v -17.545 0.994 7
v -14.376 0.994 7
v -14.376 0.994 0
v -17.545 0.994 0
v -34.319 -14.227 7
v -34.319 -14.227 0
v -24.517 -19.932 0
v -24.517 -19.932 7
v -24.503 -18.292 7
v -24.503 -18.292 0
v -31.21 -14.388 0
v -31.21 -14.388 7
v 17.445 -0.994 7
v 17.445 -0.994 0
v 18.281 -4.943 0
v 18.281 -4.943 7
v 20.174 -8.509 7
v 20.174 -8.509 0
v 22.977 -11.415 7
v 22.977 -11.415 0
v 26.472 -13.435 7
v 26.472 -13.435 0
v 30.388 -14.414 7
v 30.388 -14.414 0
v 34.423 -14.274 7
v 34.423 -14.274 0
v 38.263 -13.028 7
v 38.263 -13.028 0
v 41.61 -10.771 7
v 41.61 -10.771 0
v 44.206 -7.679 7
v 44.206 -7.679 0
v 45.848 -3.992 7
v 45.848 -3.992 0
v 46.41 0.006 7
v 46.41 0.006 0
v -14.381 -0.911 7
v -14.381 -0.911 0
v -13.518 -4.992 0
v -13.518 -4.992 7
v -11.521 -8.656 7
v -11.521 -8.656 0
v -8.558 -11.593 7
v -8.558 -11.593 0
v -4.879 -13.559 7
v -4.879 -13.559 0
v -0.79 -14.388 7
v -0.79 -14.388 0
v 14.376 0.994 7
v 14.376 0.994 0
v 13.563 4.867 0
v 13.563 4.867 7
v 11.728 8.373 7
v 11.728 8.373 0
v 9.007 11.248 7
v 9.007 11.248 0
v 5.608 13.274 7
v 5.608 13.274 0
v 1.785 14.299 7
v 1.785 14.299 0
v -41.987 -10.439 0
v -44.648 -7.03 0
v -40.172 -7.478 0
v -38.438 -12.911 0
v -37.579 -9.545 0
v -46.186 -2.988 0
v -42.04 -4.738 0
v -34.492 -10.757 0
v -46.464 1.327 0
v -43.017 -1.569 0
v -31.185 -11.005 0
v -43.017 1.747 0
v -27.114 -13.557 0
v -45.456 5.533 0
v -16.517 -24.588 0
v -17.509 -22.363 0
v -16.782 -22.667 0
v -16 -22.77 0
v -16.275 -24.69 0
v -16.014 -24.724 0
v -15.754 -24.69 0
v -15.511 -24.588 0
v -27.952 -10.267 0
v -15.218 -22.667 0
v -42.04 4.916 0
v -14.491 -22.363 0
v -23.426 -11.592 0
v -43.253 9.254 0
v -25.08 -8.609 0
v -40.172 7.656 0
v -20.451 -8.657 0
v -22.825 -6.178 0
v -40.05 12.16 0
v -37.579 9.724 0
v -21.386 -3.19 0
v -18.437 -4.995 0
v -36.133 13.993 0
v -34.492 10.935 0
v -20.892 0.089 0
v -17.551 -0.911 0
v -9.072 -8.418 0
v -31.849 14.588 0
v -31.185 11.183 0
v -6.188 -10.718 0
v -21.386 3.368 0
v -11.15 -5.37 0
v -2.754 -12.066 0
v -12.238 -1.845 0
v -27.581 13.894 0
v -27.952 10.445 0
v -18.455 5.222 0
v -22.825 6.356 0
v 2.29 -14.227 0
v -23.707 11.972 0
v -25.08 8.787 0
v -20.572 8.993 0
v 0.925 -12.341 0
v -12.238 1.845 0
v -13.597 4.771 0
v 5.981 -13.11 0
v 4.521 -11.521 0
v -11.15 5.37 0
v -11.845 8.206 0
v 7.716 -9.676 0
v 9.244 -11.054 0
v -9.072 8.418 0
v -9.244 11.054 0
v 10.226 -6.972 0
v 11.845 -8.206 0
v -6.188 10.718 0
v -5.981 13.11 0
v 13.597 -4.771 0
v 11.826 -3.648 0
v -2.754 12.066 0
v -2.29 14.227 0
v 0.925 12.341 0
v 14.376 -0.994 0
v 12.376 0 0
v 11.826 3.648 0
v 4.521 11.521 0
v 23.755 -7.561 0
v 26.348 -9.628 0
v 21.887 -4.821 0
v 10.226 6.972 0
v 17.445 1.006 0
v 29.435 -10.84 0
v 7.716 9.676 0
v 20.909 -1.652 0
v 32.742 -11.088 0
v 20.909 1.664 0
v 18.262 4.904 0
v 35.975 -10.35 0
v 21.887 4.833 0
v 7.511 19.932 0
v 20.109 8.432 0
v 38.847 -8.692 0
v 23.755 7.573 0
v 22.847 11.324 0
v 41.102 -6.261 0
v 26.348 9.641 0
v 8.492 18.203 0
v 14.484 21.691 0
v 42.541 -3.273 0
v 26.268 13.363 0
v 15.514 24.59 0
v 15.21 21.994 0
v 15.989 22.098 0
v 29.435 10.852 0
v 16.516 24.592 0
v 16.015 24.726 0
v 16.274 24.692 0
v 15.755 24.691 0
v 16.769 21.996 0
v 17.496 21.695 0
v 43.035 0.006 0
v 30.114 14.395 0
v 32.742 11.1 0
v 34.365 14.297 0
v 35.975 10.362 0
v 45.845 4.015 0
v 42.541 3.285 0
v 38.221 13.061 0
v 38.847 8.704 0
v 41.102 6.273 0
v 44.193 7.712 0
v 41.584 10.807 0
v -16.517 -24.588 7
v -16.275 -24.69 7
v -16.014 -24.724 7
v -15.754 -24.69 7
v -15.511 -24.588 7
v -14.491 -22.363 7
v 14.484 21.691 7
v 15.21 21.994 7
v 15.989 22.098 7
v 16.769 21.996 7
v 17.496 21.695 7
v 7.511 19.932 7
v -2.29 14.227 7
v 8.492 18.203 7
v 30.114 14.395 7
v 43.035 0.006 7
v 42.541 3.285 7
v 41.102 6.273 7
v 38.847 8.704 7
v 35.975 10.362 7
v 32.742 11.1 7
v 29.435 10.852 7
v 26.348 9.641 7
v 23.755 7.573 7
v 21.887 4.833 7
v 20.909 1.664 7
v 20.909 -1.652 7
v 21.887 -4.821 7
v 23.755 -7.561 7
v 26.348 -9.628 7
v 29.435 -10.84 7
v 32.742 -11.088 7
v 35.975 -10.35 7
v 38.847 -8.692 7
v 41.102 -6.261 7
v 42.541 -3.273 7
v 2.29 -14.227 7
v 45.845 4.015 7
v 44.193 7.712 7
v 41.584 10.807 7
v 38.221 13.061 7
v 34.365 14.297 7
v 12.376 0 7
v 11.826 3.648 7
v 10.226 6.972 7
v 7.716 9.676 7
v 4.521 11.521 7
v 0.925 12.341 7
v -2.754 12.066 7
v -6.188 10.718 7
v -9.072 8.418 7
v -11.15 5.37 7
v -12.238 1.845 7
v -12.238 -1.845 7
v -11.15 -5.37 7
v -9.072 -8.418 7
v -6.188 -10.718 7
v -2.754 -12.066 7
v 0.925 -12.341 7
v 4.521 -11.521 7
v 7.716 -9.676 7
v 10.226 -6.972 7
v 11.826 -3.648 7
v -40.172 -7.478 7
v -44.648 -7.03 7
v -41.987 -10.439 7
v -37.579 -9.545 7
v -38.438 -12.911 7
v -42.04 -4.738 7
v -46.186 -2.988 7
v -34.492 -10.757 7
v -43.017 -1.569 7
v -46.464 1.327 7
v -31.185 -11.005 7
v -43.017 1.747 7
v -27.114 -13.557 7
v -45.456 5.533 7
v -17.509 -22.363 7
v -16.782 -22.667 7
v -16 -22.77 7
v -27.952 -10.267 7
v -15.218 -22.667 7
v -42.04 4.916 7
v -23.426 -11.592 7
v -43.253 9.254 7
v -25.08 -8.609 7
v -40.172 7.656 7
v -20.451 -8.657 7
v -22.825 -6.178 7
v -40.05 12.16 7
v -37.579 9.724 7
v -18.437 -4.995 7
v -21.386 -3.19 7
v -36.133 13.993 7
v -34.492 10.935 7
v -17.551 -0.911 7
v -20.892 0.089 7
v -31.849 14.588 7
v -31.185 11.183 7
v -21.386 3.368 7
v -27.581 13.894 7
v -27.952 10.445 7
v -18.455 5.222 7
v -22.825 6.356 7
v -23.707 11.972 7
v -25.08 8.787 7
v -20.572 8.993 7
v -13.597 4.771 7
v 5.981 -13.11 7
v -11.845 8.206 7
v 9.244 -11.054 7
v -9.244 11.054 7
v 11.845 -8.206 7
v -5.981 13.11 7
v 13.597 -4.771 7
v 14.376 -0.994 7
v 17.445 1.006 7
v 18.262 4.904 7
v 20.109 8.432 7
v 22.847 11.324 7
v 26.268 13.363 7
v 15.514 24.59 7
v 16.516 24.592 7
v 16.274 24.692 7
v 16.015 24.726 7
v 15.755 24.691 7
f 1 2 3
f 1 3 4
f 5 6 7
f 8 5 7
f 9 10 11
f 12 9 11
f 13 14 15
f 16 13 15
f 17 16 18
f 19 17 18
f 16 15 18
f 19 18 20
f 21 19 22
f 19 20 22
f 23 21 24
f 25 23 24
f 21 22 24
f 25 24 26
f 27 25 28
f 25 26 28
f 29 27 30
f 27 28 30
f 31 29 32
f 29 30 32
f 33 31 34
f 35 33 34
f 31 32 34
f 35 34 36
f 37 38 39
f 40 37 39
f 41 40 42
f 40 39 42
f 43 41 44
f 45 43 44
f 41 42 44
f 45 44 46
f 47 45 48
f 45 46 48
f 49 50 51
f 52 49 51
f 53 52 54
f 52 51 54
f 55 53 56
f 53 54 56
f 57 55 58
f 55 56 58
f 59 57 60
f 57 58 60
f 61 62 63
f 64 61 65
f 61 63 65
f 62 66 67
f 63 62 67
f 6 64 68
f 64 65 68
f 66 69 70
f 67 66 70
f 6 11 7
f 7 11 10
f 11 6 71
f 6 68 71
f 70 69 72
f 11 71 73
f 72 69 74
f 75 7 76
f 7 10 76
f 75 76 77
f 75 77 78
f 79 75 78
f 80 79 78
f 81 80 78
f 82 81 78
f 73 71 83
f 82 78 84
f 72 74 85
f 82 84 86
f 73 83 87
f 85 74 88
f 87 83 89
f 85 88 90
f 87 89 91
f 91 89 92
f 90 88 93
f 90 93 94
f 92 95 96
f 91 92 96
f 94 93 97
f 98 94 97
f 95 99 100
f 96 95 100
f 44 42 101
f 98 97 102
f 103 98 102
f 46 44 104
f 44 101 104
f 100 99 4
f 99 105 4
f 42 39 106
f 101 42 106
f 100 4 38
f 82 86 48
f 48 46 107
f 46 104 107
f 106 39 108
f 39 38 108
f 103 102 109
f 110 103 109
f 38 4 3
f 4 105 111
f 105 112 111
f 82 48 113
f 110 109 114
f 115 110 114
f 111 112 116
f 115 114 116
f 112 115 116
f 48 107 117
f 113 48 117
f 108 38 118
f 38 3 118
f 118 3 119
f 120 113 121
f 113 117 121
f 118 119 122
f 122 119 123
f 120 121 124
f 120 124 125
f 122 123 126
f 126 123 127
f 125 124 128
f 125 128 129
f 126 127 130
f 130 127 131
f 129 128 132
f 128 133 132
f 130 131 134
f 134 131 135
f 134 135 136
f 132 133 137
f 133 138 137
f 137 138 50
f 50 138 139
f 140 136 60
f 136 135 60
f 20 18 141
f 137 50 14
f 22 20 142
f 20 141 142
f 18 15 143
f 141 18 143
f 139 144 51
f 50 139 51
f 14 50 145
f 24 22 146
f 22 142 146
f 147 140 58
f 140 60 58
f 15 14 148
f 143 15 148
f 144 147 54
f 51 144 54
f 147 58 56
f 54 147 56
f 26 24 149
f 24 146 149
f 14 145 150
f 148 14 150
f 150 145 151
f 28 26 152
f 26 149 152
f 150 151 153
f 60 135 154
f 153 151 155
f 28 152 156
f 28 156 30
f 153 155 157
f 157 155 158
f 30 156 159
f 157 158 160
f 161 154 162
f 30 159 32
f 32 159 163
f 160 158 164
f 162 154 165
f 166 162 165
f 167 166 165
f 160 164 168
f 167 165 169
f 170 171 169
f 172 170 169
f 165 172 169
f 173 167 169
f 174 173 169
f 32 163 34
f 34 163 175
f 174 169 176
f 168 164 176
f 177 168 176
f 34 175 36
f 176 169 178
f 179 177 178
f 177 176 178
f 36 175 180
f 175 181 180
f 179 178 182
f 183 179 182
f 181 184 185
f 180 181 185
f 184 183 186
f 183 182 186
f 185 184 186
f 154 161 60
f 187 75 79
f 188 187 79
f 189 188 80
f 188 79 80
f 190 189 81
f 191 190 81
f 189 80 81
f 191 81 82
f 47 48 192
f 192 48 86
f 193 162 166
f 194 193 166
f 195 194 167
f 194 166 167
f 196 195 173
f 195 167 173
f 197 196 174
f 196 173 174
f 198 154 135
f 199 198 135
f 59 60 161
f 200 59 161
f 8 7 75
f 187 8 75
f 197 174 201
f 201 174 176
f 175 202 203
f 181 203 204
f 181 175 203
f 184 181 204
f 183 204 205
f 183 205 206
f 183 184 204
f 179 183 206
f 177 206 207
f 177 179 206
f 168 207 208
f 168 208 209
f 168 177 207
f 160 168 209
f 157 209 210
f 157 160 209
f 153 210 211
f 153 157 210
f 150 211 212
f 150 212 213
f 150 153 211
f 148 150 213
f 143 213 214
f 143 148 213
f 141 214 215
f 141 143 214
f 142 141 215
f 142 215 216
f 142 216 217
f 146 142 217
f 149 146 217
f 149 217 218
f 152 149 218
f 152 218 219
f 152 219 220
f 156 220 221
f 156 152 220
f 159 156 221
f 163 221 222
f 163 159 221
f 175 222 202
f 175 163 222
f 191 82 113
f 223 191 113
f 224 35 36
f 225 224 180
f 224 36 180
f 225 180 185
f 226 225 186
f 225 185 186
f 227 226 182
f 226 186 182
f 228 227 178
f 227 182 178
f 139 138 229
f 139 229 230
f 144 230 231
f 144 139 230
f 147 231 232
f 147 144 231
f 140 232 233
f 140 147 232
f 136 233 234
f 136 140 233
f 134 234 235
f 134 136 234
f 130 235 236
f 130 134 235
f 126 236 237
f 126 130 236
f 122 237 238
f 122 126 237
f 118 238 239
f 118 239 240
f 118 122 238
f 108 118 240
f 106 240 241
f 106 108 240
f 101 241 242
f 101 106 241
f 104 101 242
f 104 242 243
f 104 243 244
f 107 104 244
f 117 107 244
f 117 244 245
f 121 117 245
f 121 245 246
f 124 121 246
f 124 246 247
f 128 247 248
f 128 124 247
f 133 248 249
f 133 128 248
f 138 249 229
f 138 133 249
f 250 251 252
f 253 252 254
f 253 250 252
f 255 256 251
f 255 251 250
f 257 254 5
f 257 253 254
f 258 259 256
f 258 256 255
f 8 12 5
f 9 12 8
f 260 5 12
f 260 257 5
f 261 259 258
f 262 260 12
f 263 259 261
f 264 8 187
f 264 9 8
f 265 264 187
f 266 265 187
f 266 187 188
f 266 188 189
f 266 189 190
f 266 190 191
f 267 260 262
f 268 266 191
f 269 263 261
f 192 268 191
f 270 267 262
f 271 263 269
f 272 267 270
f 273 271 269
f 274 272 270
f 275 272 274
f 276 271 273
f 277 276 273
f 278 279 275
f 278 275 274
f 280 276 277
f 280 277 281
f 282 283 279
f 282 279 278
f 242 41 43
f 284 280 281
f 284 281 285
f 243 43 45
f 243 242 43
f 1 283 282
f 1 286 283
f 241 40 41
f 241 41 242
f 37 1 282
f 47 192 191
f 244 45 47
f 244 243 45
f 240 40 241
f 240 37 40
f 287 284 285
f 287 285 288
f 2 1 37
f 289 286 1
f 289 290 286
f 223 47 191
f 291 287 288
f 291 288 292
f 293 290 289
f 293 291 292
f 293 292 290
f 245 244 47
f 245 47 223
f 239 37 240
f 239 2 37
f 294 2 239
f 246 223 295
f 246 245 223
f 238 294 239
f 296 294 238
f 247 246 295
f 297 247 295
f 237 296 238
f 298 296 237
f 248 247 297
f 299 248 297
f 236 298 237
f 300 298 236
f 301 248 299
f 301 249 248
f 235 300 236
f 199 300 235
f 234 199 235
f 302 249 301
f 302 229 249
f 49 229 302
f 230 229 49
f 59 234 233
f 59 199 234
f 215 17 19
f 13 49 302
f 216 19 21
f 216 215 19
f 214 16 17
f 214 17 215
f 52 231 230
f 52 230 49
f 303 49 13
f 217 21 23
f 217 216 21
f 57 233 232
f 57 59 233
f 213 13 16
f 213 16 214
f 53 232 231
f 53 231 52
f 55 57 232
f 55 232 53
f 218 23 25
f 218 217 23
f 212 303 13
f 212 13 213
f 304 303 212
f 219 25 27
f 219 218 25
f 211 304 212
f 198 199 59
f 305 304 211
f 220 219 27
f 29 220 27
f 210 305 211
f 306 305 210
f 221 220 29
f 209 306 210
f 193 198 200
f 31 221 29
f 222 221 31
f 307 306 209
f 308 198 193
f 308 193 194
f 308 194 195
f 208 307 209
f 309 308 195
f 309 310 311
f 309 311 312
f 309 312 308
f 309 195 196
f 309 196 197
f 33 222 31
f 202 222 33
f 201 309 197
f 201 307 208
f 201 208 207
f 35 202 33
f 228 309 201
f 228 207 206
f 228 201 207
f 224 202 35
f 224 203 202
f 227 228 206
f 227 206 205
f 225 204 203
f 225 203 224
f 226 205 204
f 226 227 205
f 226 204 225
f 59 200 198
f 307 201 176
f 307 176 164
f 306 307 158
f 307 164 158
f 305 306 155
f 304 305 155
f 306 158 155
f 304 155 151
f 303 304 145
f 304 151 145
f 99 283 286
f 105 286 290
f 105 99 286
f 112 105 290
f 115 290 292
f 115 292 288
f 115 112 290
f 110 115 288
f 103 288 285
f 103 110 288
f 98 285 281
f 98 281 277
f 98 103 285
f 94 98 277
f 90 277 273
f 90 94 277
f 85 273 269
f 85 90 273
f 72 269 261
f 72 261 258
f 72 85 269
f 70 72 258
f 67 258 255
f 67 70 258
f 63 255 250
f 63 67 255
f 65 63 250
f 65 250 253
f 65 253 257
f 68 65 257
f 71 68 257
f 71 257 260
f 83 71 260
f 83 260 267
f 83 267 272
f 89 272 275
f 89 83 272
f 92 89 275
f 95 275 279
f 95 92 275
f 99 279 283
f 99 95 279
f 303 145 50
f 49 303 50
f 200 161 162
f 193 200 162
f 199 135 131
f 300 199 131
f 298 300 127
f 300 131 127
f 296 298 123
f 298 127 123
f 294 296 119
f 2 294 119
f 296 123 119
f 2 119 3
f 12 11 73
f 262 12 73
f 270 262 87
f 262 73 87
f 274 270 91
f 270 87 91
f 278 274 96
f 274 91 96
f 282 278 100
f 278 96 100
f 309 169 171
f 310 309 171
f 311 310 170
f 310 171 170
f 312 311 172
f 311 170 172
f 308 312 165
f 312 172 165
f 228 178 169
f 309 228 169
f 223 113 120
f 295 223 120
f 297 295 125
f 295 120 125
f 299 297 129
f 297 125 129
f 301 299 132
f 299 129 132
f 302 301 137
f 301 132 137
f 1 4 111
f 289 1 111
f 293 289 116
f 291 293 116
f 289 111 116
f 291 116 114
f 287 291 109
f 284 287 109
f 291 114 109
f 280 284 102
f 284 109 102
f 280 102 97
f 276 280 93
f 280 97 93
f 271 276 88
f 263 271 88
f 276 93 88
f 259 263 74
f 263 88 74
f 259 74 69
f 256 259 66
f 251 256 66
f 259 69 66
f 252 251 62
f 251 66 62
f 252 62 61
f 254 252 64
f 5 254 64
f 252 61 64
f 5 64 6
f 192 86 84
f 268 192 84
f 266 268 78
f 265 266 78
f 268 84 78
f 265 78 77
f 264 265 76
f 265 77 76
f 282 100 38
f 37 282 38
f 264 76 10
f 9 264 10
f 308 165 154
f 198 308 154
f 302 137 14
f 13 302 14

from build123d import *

# Parameters (mm, degrees)
F0_R     = 11.125
F0_R_2   = 12.376086
F1_DEPTH = 7


with BuildPart() as f1:
    # F0 (on Top) → F1 (new body)
    with BuildSketch(Plane.XY):
        with BuildLine():
            ThreePointArc((-17.516571, 0.089216), (-17.523634, 0.541725), (-17.544814, 0.993793))
            ThreePointArc((-17.544814, 0.993793), (-41.760355, 10.827403), (-34.318804, -14.22685))
            ThreePointArc((-34.318804, -14.22685), (-32.768784, -14.39126), (-31.210072, -14.388338))
            ThreePointArc((-31.210072, -14.388338), (-21.832298, -10.23215), (-17.551095, -0.910784))
            ThreePointArc((-17.551095, -0.910784), (-17.525205, -0.411082), (-17.516571, 0.089216))
        make_face()
        with Locations((-32.016571, 0.089216)):
            Circle(F0_R, mode=Mode.SUBTRACT)
        with BuildLine():
            ThreePointArc((14.375696, -0.993793), (14.401426, -0.497193), (14.410006, 0))
            ThreePointArc((14.410006, 0), (14.401426, 0.497193), (14.375696, 0.993793))
            ThreePointArc((14.375696, 0.993793), (10.466538, 9.904537), (1.784877, 14.299038))
            ThreePointArc((1.784877, 14.299038), (-0.255218, 14.407745), (-2.290183, 14.226852))
            ThreePointArc((-2.290183, 14.226852), (-10.640317, 9.717609), (-14.375696, 0.993793))
            ThreePointArc((-14.375696, 0.993793), (-14.409946, 0.041595), (-14.381194, -0.910784))
            ThreePointArc((-14.381194, -0.910784), (-10.146519, -10.232127), (-0.789928, -14.388338))
            ThreePointArc((-0.789928, -14.388338), (0.754468, -14.390241), (2.290198, -14.22685))
            ThreePointArc((2.290198, -14.22685), (10.640322, -9.717603), (14.375696, -0.993793))
        make_face()
        Circle(F0_R_2, mode=Mode.SUBTRACT)
        with BuildLine():
            Line((-15.511252, -24.588406), (2.290198, -14.22685))
            ThreePointArc((2.290198, -14.22685), (0.754468, -14.390241), (-0.789928, -14.388338))
            Line((-0.789928, -14.388338), (-14.490846, -22.363129))
            ThreePointArc((-14.490846, -22.363129), (-16, -22.770359), (-17.509154, -22.363129))
            Line((-17.509154, -22.363129), (-24.503051, -18.292243))
            Line((-24.503051, -18.292243), (-31.210072, -14.388338))
            ThreePointArc((-31.210072, -14.388338), (-32.768784, -14.39126), (-34.318804, -14.22685))
            Line((-34.318804, -14.22685), (-24.517354, -19.931906))
            Line((-24.517354, -19.931906), (-16.517354, -24.588406))
            ThreePointArc((-16.517354, -24.588406), (-16.014303, -24.724149), (-15.511252, -24.588406))
        make_face()
        with BuildLine():
            ThreePointArc((30.114196, 14.394545), (21.378316, 9.9726), (17.444744, 1.006207))
            ThreePointArc((17.444744, 1.006207), (17.41022, 0.006207), (17.444744, -0.993793))
            ThreePointArc((17.444744, -0.993793), (32.410518, -14.48516), (46.41022, 0.006207))
            ThreePointArc((46.41022, 0.006207), (42.997331, 9.351042), (34.36526, 14.29686))
            ThreePointArc((34.36526, 14.29686), (32.243328, 14.50238), (30.114196, 14.394545))
        make_face()
        with Locations((31.91022, 0.006207)):
            Circle(F0_R, mode=Mode.SUBTRACT)
        with BuildLine():
            ThreePointArc((14.375696, 0.993793), (14.401426, 0.497193), (14.410006, 0))
            ThreePointArc((14.410006, 0), (14.401426, -0.497193), (14.375696, -0.993793))
            Line((14.375696, -0.993793), (17.444744, -0.993793))
            ThreePointArc((17.444744, -0.993793), (17.41022, 0.006207), (17.444744, 1.006207))
            Line((17.444744, 1.006207), (14.375696, 0.993793))
        make_face()
        with BuildLine():
            ThreePointArc((-2.290183, 14.226852), (-0.255218, 14.407745), (1.784877, 14.299038))
            Line((1.784877, 14.299038), (8.491907, 18.202972))
            Line((8.491907, 18.202972), (14.48426, 21.690918))
            ThreePointArc((14.48426, 21.690918), (15.98947, 22.09815), (17.495747, 21.694885))
            Line((17.495747, 21.694885), (30.114196, 14.394545))
            ThreePointArc((30.114196, 14.394545), (32.243328, 14.50238), (34.36526, 14.29686))
            Line((34.36526, 14.29686), (16.516219, 24.591779))
            ThreePointArc((16.516219, 24.591779), (16.014611, 24.725537), (15.513537, 24.589794))
            Line((15.513537, 24.589794), (7.511249, 19.931933))
            Line((7.511249, 19.931933), (-2.290183, 14.226852))
        make_face()
        with BuildLine():
            ThreePointArc((-14.381194, -0.910784), (-14.409946, 0.041595), (-14.375696, 0.993793))
            Line((-14.375696, 0.993793), (-15.91022, 0.993793))
            Line((-15.91022, 0.993793), (-17.544814, 0.993793))
            ThreePointArc((-17.544814, 0.993793), (-17.523634, 0.541725), (-17.516571, 0.089216))
            ThreePointArc((-17.516571, 0.089216), (-17.525205, -0.411082), (-17.551095, -0.910784))
            Line((-17.551095, -0.910784), (-16.016571, -0.910784))
            Line((-16.016571, -0.910784), (-14.381194, -0.910784))
        make_face()
    extrude(amount=F1_DEPTH)


solid = f1.part
